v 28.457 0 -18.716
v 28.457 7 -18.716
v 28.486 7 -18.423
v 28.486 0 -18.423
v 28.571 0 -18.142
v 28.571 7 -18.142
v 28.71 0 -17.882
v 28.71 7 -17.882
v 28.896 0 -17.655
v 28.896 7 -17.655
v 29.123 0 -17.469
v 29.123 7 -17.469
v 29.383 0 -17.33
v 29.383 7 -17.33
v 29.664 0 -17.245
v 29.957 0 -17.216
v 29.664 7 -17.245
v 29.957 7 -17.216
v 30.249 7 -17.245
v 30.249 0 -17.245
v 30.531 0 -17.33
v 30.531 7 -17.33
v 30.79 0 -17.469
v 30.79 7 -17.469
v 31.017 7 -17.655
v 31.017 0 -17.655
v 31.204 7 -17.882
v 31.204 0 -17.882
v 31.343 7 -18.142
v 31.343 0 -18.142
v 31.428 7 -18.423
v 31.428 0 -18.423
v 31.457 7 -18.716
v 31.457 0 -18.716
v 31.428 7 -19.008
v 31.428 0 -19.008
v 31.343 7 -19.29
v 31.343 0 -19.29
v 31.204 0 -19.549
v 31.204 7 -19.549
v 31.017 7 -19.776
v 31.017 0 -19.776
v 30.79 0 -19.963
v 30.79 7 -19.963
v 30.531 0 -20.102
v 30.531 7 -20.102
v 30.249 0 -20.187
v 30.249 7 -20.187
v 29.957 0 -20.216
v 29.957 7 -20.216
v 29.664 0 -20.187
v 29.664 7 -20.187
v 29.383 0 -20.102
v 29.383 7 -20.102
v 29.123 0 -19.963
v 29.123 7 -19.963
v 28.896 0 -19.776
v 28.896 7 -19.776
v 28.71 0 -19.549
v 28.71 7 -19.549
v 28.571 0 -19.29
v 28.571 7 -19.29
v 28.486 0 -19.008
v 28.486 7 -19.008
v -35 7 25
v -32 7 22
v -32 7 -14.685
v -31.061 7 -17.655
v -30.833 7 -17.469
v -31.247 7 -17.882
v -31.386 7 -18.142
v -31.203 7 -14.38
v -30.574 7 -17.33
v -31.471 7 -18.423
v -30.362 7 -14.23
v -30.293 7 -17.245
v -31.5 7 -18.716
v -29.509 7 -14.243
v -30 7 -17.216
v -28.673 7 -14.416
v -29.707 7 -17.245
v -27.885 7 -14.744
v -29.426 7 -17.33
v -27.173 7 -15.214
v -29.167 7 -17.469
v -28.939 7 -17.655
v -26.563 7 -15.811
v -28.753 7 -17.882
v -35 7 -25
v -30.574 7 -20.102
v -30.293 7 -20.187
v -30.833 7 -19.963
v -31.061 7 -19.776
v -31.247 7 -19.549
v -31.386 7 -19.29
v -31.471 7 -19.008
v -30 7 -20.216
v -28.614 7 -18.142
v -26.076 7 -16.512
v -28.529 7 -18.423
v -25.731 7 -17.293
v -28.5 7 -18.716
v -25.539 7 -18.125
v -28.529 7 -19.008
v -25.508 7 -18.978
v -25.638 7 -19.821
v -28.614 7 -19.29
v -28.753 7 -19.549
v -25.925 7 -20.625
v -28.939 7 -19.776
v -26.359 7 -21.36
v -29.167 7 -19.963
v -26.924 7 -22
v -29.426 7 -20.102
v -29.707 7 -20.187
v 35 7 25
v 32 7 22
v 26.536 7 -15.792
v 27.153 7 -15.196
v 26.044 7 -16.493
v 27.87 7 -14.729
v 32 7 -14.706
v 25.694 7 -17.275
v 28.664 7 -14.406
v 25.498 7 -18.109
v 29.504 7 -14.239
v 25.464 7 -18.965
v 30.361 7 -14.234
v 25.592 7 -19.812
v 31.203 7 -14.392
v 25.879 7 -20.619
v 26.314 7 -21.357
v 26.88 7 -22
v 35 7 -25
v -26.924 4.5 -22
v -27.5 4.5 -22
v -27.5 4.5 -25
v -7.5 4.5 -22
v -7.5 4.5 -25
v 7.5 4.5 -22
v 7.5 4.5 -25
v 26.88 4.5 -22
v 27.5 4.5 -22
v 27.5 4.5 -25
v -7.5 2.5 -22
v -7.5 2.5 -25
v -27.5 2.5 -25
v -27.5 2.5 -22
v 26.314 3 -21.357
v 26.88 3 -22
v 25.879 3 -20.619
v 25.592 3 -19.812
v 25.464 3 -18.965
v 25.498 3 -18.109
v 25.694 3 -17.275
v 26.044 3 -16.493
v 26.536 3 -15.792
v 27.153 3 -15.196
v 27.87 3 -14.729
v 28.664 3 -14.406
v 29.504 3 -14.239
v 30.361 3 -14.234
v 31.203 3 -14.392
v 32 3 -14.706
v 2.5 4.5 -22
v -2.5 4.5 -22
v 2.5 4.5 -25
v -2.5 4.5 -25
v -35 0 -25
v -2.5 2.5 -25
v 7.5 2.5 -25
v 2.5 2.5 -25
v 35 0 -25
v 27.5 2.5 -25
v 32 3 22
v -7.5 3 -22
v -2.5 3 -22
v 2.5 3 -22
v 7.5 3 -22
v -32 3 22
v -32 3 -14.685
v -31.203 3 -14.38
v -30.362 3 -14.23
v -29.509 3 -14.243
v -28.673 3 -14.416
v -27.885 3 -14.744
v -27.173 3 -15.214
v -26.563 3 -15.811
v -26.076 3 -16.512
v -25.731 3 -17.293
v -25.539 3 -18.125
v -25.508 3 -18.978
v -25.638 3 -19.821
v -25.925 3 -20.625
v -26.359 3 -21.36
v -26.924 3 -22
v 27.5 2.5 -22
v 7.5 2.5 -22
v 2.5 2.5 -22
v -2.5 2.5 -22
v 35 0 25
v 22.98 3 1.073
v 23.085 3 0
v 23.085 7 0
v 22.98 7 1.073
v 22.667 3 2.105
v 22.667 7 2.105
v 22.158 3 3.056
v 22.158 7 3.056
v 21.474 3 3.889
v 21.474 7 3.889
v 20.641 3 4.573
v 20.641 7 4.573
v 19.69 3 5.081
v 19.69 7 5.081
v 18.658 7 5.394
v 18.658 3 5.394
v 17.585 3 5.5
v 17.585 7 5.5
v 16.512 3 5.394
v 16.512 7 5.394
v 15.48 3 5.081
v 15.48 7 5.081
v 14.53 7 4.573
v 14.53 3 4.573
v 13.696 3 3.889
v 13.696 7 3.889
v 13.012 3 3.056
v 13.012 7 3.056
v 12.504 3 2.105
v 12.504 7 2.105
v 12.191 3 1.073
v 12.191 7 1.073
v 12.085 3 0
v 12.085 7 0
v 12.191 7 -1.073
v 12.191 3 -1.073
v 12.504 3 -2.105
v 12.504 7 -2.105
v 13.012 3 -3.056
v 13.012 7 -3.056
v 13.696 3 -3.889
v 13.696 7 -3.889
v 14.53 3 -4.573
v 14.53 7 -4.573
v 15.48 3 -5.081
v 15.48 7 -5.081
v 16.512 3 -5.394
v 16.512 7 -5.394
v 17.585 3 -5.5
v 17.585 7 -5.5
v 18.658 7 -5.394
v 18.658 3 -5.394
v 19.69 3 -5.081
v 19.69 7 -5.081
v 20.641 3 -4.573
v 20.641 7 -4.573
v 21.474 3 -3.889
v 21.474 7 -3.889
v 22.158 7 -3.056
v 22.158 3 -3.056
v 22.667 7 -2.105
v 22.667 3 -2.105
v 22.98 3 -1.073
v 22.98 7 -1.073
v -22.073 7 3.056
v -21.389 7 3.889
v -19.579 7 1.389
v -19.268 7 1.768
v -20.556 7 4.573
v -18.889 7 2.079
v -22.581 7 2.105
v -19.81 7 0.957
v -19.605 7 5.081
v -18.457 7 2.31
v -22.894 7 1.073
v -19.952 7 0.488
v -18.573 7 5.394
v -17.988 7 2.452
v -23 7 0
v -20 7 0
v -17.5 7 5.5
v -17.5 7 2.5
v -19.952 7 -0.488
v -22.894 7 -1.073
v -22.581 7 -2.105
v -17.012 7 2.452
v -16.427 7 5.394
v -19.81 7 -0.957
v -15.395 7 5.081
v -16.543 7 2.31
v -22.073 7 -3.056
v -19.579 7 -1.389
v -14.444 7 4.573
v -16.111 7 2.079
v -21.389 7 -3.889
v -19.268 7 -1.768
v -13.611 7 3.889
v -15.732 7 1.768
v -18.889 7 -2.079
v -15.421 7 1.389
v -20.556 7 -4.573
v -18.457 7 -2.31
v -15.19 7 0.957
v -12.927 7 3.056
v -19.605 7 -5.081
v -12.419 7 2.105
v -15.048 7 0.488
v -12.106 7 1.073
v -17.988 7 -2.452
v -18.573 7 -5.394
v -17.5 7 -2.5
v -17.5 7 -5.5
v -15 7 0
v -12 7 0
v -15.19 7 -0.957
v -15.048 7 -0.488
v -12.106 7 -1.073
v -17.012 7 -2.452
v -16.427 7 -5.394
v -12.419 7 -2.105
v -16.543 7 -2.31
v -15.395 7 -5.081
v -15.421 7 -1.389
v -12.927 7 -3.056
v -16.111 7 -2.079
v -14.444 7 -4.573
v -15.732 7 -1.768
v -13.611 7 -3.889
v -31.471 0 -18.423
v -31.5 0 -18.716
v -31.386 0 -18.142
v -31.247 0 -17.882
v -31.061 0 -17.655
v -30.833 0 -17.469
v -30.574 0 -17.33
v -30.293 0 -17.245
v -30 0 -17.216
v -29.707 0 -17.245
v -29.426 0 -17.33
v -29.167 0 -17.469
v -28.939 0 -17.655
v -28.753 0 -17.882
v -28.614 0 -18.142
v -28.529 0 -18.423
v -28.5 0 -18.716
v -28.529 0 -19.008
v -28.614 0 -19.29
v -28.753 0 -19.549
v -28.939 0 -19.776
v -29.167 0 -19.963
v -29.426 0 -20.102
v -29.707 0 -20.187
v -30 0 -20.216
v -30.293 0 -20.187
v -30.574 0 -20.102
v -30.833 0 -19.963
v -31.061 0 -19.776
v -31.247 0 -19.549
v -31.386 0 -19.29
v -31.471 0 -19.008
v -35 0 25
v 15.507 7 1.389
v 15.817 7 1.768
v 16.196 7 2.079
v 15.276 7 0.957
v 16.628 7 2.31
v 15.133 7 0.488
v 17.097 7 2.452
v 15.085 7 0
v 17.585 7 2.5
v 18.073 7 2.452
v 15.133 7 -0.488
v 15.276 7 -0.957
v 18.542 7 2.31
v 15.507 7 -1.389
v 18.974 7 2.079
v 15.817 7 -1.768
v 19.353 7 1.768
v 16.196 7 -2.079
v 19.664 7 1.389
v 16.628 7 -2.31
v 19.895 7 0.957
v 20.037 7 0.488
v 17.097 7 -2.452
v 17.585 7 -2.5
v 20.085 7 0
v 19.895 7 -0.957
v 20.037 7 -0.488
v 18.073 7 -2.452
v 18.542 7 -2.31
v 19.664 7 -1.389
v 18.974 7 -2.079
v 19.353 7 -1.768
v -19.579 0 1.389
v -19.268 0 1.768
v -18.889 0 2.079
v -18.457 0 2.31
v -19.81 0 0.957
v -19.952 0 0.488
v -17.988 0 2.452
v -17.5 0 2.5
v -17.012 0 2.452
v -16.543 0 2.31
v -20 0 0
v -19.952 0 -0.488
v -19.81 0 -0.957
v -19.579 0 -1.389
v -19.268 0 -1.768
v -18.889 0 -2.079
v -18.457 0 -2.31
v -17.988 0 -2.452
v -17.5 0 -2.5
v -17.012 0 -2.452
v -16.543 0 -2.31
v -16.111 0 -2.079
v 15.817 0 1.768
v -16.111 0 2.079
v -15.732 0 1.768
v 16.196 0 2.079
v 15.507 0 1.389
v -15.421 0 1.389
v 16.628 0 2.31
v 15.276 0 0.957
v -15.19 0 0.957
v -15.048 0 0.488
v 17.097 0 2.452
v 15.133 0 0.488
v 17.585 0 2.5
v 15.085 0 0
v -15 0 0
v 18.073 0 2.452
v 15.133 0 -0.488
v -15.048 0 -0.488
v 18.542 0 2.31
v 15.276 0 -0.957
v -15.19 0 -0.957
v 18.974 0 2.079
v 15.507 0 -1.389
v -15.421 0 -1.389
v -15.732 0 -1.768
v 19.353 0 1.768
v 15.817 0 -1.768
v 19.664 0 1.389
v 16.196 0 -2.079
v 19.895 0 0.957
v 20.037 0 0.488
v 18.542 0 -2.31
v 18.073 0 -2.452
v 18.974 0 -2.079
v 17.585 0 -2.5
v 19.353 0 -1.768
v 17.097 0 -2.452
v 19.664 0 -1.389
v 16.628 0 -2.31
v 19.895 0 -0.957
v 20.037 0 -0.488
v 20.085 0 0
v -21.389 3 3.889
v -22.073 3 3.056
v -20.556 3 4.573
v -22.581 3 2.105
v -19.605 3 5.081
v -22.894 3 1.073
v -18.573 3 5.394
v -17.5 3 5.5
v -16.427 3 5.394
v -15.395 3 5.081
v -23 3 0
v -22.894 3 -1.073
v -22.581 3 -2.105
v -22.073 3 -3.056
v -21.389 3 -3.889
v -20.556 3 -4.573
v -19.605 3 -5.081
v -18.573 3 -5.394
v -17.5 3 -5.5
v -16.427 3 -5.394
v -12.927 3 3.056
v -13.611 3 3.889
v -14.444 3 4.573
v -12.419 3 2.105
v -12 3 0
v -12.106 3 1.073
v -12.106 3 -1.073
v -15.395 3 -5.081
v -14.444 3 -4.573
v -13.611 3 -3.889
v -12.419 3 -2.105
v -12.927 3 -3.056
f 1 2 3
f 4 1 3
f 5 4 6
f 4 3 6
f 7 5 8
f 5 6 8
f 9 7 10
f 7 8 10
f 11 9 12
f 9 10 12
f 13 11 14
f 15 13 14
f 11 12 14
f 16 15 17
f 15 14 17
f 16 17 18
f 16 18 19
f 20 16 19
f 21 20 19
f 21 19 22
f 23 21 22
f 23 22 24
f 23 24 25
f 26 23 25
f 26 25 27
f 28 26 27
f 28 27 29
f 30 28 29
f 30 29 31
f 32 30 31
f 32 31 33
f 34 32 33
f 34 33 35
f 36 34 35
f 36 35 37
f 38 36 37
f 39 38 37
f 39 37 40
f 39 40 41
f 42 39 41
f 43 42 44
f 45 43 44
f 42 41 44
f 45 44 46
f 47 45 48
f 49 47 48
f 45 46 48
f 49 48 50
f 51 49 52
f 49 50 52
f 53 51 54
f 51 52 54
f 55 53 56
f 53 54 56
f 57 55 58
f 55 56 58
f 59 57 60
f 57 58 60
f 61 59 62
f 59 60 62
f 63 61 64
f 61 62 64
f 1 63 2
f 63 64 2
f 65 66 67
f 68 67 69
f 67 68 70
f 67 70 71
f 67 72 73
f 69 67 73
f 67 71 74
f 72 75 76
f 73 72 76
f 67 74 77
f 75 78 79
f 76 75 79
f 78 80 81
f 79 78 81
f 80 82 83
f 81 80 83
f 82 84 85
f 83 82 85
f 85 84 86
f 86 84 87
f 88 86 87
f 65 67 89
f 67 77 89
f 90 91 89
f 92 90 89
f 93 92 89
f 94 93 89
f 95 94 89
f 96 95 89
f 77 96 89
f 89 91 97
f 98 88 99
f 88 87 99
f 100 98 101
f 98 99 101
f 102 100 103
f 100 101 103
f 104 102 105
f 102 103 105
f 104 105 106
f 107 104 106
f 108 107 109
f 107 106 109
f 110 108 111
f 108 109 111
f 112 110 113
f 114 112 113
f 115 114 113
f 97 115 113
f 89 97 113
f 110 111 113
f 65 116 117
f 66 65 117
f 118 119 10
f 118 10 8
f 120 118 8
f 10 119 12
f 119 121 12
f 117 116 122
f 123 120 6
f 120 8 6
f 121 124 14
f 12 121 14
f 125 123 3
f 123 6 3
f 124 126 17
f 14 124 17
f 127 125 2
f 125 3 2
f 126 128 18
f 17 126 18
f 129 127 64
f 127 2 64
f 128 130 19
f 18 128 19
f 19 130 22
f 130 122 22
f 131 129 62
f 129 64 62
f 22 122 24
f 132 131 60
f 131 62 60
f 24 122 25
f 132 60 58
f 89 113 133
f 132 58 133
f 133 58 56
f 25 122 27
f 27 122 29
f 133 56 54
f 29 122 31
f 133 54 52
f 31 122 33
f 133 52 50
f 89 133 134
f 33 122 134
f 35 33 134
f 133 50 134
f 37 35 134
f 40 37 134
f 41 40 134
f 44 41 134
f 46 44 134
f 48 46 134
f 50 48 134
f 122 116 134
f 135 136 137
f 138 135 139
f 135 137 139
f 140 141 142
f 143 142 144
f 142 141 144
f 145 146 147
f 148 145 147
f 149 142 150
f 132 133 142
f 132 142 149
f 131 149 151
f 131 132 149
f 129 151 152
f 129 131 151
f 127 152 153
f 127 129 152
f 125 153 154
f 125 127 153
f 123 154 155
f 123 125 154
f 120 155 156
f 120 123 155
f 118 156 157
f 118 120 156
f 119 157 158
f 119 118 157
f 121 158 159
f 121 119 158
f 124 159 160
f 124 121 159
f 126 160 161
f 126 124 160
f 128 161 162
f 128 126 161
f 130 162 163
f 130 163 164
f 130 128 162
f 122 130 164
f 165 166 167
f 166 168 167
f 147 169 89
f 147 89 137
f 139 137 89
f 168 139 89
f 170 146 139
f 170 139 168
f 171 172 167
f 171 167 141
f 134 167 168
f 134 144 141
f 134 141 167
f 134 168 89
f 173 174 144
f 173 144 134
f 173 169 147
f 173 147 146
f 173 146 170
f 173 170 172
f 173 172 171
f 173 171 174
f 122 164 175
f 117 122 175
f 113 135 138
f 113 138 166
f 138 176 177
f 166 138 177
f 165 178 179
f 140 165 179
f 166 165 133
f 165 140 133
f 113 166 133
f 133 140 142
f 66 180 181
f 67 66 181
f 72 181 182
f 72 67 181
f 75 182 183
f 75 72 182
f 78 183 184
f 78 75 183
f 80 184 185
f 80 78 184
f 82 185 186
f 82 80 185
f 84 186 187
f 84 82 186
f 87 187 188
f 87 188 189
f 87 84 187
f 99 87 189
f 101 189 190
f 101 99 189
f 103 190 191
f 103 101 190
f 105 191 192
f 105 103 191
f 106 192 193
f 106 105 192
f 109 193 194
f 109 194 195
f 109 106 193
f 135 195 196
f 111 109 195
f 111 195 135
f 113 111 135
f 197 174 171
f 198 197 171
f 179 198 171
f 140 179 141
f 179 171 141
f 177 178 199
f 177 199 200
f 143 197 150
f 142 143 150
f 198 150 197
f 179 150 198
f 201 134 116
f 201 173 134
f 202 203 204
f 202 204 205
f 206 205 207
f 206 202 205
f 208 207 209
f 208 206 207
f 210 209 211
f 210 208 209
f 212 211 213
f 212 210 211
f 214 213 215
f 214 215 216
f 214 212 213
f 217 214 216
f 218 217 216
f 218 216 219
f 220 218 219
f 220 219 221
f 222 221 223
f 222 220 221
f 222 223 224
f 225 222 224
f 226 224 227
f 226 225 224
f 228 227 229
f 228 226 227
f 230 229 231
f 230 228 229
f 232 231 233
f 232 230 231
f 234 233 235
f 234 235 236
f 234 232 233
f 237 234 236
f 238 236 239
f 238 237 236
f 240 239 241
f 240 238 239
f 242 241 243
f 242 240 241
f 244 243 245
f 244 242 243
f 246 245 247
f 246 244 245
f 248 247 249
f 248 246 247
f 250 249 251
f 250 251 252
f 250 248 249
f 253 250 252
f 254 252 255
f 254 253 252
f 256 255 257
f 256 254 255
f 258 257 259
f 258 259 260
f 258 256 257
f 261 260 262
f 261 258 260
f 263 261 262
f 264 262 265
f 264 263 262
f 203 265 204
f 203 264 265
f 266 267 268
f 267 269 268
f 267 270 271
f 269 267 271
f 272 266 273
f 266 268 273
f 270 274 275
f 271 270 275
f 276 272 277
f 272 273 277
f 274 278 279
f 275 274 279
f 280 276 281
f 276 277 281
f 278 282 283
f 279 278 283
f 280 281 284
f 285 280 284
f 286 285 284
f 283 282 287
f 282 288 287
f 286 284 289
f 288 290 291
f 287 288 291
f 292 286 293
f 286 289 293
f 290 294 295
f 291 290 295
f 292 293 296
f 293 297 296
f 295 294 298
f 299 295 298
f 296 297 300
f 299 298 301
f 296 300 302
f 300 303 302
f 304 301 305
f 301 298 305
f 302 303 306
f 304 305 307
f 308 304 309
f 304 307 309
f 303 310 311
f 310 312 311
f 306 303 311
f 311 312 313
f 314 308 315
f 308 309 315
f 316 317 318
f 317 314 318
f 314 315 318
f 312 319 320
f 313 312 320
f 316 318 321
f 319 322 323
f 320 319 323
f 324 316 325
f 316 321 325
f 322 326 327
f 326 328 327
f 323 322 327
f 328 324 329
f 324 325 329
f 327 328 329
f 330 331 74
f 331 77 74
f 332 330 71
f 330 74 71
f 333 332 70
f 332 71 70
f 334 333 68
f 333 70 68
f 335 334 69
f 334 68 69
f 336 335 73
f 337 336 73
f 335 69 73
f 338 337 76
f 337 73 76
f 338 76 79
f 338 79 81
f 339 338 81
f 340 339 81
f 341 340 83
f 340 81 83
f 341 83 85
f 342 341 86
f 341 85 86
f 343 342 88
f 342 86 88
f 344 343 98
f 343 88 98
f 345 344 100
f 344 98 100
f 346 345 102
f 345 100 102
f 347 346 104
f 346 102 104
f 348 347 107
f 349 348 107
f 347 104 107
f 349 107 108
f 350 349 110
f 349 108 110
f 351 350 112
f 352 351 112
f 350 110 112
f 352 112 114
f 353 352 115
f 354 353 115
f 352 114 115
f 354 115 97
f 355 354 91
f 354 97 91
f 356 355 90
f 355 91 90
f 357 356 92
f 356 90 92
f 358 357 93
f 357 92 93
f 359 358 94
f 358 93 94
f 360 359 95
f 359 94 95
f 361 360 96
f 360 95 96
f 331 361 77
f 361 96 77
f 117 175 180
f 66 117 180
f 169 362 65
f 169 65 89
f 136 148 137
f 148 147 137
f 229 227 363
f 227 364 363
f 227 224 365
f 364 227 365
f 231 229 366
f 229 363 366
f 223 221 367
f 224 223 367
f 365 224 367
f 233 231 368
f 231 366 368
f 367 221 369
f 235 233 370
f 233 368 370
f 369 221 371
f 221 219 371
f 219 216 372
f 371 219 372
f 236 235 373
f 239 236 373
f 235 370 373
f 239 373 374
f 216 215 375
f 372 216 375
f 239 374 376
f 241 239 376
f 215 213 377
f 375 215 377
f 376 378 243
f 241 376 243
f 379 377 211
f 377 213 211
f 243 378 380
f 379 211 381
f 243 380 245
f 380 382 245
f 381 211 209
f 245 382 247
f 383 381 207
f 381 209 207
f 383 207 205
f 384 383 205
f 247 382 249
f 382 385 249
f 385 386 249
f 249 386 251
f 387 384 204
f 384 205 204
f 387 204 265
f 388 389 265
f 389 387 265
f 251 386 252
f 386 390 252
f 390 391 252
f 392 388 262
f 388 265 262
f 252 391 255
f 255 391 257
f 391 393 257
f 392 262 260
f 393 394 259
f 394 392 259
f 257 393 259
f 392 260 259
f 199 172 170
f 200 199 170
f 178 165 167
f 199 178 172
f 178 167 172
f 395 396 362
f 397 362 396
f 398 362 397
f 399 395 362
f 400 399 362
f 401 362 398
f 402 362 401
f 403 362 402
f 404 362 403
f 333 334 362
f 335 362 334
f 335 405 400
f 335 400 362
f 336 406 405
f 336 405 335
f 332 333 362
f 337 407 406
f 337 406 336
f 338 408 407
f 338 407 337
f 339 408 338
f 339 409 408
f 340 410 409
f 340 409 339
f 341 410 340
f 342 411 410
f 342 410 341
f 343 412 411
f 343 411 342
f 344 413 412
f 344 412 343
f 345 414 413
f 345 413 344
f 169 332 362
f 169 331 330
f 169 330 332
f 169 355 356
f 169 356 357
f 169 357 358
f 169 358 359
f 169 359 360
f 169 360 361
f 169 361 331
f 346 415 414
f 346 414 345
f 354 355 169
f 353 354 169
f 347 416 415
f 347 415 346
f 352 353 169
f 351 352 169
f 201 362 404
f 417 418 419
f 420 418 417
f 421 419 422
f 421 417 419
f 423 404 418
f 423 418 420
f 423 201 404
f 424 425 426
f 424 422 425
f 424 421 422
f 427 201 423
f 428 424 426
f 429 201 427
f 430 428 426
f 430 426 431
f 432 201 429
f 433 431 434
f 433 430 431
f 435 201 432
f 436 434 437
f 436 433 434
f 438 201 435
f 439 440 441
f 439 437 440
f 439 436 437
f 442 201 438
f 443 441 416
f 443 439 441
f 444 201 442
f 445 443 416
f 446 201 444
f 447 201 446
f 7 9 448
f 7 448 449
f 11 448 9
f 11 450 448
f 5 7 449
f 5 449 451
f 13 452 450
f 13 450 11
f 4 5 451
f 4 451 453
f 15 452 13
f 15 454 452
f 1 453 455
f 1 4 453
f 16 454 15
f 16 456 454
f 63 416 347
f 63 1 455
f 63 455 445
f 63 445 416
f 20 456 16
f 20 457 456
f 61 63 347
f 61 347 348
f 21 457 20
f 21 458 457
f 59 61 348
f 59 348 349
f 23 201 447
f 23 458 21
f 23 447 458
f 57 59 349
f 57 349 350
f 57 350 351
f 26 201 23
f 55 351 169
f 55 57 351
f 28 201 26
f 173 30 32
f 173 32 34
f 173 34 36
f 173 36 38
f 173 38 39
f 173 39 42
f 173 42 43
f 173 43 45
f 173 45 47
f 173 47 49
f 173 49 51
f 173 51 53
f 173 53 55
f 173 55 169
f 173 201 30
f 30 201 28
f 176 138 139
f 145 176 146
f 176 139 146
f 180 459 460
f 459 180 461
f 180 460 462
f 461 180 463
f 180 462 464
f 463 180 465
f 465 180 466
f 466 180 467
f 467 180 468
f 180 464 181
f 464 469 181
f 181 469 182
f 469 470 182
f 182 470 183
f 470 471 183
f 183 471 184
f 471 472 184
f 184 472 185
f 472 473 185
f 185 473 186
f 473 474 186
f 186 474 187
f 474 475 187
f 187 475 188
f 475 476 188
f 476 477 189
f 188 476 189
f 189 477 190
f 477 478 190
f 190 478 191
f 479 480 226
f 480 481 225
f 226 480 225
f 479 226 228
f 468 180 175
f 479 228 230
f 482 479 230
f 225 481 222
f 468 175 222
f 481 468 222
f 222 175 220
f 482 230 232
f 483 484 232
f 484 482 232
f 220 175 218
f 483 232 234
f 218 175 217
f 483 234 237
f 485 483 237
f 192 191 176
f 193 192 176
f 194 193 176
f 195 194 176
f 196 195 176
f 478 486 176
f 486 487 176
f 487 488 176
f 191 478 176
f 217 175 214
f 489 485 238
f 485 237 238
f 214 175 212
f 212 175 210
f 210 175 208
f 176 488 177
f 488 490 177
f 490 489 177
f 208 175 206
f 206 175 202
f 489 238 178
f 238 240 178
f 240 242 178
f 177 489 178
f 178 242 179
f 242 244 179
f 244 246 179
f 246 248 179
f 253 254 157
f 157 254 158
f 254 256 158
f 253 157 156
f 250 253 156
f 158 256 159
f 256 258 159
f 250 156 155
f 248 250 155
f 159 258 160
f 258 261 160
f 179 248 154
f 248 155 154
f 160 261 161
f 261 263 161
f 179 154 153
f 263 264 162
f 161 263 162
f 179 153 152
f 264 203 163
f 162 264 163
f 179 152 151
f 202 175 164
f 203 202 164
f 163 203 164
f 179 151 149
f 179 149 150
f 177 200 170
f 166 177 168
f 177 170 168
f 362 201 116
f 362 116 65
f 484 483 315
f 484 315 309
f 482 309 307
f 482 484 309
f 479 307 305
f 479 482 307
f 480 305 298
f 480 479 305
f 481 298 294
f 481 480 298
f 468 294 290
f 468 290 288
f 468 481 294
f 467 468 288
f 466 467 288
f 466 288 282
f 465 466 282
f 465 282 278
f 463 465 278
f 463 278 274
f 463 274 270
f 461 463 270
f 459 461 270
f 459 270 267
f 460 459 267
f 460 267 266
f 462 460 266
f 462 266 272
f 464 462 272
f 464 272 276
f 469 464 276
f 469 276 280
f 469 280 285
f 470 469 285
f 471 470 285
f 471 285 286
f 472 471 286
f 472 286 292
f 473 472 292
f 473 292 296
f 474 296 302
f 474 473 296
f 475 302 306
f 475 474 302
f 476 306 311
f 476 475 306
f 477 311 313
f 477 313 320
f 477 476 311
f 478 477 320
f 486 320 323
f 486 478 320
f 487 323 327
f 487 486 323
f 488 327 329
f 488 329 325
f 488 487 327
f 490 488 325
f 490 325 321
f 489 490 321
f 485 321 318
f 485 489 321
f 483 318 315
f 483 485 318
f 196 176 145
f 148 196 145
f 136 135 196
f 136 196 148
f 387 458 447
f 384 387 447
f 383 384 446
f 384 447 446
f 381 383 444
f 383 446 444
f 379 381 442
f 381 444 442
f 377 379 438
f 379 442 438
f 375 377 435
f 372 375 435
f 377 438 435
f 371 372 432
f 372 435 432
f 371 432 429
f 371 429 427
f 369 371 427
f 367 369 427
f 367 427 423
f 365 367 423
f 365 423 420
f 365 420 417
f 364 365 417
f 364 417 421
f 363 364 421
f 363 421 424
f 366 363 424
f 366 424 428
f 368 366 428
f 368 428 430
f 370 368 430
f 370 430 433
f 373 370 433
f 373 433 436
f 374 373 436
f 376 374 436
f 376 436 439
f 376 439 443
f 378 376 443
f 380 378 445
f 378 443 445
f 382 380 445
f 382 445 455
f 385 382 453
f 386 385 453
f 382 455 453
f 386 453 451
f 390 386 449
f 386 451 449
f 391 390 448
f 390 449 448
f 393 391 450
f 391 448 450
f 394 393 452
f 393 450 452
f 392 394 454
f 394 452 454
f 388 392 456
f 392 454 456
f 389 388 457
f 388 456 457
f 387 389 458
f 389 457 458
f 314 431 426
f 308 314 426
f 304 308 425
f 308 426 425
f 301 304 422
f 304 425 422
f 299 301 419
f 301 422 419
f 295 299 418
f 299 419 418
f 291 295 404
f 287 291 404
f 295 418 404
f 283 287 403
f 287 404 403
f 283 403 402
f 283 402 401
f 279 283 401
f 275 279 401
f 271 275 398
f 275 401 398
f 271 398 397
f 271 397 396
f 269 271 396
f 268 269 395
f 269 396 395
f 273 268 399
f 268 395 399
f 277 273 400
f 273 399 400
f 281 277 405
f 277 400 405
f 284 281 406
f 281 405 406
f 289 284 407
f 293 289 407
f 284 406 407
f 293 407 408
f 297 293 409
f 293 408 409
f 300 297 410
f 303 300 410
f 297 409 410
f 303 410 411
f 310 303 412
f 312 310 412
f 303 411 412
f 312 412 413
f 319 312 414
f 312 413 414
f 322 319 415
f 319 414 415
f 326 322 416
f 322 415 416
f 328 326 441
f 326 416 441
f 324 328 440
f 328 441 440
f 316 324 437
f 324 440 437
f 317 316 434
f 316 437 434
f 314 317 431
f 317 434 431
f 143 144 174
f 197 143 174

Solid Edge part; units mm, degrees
sketch "Sketch1" plane through (0, 0, 0) normal (0, -1, 0) x (1, 0, 0)
  line L0 (35, 25) -> (-35, 25)
  line L1 (-35, 25) -> (-35, -25)
  line L2 (-35, -25) -> (35, -25)
  line L3 (35, -25) -> (35, 25)
extrude "Protrusion1" add sketch "Sketch1" against normal blind 7
sketch "Sketch2" plane through (0, 0, 0) normal (0, -1, 0) x (1, 0, 0)
  circle A0 centre (17.5852, 0) radius 2.5
extrude "ExtrudedCutout_1" cut sketch "Sketch2" against normal blind 7
sketch "Sketch3" plane through (0, 0, 0) normal (0, -1, 0) x (1, 0, 0)
  circle A0 centre (-17.5, 0) radius 2.5
extrude "ExtrudedCutout_2" cut sketch "Sketch3" against normal blind 7
sketch "Sketch4" plane through (0, 7, 0) normal (0, 1, 0) x (-1, 0, 0)
  circle A0 centre (-29.9568, -18.7158) radius 1.5
extrude "ExtrudedCutout_3" cut sketch "Sketch4" against normal blind 7
sketch "Sketch5" plane through (0, 7, 0) normal (0, 1, 0) x (-1, 0, 0)
  circle A0 centre (30, -18.7158) radius 1.5
extrude "ExtrudedCutout_4" cut sketch "Sketch5" against normal blind 7
shell "Thinwall_2" thickness 3 removed faces 1 at (-22.6333, 7, 17.1667)
sketch "Sketch6" plane through (0, 3.5, -25) normal (0, 0, -1) x (-1, 0, 0)
  line L0 (-7.5, 1) -> (-27.5, 1)
  line L1 (-27.5, 1) -> (-27.5, -1)
  line L2 (-27.5, -1) -> (-7.5, -1)
  line L3 (-7.5, -1) -> (-7.5, 1)
extrude "ExtrudedCutout_6" cut sketch "Sketch6" against normal blind 3
sketch "Sketch7" plane through (0, 3.5, -25) normal (0, 0, -1) x (-1, 0, 0)
  line L0 (2.5, -1) -> (2.5, 1)
  line L1 (2.5, 1) -> (-2.5, 1)
  line L2 (-2.5, 1) -> (-2.5, -1)
  line L3 (-2.5, -1) -> (2.5, -1)
extrude "ExtrudedCutout_7" cut sketch "Sketch7" against normal blind 3
sketch "Sketch8" plane through (0, 3.5, -25) normal (0, 0, -1) x (-1, 0, 0)
  line L0 (27.5, 1) -> (7.5, 1)
  line L1 (7.5, 1) -> (7.5, -1)
  line L2 (7.5, -1) -> (27.5, -1)
  line L3 (27.5, -1) -> (27.5, 1)
extrude "ExtrudedCutout_8" cut sketch "Sketch8" against normal blind 3
